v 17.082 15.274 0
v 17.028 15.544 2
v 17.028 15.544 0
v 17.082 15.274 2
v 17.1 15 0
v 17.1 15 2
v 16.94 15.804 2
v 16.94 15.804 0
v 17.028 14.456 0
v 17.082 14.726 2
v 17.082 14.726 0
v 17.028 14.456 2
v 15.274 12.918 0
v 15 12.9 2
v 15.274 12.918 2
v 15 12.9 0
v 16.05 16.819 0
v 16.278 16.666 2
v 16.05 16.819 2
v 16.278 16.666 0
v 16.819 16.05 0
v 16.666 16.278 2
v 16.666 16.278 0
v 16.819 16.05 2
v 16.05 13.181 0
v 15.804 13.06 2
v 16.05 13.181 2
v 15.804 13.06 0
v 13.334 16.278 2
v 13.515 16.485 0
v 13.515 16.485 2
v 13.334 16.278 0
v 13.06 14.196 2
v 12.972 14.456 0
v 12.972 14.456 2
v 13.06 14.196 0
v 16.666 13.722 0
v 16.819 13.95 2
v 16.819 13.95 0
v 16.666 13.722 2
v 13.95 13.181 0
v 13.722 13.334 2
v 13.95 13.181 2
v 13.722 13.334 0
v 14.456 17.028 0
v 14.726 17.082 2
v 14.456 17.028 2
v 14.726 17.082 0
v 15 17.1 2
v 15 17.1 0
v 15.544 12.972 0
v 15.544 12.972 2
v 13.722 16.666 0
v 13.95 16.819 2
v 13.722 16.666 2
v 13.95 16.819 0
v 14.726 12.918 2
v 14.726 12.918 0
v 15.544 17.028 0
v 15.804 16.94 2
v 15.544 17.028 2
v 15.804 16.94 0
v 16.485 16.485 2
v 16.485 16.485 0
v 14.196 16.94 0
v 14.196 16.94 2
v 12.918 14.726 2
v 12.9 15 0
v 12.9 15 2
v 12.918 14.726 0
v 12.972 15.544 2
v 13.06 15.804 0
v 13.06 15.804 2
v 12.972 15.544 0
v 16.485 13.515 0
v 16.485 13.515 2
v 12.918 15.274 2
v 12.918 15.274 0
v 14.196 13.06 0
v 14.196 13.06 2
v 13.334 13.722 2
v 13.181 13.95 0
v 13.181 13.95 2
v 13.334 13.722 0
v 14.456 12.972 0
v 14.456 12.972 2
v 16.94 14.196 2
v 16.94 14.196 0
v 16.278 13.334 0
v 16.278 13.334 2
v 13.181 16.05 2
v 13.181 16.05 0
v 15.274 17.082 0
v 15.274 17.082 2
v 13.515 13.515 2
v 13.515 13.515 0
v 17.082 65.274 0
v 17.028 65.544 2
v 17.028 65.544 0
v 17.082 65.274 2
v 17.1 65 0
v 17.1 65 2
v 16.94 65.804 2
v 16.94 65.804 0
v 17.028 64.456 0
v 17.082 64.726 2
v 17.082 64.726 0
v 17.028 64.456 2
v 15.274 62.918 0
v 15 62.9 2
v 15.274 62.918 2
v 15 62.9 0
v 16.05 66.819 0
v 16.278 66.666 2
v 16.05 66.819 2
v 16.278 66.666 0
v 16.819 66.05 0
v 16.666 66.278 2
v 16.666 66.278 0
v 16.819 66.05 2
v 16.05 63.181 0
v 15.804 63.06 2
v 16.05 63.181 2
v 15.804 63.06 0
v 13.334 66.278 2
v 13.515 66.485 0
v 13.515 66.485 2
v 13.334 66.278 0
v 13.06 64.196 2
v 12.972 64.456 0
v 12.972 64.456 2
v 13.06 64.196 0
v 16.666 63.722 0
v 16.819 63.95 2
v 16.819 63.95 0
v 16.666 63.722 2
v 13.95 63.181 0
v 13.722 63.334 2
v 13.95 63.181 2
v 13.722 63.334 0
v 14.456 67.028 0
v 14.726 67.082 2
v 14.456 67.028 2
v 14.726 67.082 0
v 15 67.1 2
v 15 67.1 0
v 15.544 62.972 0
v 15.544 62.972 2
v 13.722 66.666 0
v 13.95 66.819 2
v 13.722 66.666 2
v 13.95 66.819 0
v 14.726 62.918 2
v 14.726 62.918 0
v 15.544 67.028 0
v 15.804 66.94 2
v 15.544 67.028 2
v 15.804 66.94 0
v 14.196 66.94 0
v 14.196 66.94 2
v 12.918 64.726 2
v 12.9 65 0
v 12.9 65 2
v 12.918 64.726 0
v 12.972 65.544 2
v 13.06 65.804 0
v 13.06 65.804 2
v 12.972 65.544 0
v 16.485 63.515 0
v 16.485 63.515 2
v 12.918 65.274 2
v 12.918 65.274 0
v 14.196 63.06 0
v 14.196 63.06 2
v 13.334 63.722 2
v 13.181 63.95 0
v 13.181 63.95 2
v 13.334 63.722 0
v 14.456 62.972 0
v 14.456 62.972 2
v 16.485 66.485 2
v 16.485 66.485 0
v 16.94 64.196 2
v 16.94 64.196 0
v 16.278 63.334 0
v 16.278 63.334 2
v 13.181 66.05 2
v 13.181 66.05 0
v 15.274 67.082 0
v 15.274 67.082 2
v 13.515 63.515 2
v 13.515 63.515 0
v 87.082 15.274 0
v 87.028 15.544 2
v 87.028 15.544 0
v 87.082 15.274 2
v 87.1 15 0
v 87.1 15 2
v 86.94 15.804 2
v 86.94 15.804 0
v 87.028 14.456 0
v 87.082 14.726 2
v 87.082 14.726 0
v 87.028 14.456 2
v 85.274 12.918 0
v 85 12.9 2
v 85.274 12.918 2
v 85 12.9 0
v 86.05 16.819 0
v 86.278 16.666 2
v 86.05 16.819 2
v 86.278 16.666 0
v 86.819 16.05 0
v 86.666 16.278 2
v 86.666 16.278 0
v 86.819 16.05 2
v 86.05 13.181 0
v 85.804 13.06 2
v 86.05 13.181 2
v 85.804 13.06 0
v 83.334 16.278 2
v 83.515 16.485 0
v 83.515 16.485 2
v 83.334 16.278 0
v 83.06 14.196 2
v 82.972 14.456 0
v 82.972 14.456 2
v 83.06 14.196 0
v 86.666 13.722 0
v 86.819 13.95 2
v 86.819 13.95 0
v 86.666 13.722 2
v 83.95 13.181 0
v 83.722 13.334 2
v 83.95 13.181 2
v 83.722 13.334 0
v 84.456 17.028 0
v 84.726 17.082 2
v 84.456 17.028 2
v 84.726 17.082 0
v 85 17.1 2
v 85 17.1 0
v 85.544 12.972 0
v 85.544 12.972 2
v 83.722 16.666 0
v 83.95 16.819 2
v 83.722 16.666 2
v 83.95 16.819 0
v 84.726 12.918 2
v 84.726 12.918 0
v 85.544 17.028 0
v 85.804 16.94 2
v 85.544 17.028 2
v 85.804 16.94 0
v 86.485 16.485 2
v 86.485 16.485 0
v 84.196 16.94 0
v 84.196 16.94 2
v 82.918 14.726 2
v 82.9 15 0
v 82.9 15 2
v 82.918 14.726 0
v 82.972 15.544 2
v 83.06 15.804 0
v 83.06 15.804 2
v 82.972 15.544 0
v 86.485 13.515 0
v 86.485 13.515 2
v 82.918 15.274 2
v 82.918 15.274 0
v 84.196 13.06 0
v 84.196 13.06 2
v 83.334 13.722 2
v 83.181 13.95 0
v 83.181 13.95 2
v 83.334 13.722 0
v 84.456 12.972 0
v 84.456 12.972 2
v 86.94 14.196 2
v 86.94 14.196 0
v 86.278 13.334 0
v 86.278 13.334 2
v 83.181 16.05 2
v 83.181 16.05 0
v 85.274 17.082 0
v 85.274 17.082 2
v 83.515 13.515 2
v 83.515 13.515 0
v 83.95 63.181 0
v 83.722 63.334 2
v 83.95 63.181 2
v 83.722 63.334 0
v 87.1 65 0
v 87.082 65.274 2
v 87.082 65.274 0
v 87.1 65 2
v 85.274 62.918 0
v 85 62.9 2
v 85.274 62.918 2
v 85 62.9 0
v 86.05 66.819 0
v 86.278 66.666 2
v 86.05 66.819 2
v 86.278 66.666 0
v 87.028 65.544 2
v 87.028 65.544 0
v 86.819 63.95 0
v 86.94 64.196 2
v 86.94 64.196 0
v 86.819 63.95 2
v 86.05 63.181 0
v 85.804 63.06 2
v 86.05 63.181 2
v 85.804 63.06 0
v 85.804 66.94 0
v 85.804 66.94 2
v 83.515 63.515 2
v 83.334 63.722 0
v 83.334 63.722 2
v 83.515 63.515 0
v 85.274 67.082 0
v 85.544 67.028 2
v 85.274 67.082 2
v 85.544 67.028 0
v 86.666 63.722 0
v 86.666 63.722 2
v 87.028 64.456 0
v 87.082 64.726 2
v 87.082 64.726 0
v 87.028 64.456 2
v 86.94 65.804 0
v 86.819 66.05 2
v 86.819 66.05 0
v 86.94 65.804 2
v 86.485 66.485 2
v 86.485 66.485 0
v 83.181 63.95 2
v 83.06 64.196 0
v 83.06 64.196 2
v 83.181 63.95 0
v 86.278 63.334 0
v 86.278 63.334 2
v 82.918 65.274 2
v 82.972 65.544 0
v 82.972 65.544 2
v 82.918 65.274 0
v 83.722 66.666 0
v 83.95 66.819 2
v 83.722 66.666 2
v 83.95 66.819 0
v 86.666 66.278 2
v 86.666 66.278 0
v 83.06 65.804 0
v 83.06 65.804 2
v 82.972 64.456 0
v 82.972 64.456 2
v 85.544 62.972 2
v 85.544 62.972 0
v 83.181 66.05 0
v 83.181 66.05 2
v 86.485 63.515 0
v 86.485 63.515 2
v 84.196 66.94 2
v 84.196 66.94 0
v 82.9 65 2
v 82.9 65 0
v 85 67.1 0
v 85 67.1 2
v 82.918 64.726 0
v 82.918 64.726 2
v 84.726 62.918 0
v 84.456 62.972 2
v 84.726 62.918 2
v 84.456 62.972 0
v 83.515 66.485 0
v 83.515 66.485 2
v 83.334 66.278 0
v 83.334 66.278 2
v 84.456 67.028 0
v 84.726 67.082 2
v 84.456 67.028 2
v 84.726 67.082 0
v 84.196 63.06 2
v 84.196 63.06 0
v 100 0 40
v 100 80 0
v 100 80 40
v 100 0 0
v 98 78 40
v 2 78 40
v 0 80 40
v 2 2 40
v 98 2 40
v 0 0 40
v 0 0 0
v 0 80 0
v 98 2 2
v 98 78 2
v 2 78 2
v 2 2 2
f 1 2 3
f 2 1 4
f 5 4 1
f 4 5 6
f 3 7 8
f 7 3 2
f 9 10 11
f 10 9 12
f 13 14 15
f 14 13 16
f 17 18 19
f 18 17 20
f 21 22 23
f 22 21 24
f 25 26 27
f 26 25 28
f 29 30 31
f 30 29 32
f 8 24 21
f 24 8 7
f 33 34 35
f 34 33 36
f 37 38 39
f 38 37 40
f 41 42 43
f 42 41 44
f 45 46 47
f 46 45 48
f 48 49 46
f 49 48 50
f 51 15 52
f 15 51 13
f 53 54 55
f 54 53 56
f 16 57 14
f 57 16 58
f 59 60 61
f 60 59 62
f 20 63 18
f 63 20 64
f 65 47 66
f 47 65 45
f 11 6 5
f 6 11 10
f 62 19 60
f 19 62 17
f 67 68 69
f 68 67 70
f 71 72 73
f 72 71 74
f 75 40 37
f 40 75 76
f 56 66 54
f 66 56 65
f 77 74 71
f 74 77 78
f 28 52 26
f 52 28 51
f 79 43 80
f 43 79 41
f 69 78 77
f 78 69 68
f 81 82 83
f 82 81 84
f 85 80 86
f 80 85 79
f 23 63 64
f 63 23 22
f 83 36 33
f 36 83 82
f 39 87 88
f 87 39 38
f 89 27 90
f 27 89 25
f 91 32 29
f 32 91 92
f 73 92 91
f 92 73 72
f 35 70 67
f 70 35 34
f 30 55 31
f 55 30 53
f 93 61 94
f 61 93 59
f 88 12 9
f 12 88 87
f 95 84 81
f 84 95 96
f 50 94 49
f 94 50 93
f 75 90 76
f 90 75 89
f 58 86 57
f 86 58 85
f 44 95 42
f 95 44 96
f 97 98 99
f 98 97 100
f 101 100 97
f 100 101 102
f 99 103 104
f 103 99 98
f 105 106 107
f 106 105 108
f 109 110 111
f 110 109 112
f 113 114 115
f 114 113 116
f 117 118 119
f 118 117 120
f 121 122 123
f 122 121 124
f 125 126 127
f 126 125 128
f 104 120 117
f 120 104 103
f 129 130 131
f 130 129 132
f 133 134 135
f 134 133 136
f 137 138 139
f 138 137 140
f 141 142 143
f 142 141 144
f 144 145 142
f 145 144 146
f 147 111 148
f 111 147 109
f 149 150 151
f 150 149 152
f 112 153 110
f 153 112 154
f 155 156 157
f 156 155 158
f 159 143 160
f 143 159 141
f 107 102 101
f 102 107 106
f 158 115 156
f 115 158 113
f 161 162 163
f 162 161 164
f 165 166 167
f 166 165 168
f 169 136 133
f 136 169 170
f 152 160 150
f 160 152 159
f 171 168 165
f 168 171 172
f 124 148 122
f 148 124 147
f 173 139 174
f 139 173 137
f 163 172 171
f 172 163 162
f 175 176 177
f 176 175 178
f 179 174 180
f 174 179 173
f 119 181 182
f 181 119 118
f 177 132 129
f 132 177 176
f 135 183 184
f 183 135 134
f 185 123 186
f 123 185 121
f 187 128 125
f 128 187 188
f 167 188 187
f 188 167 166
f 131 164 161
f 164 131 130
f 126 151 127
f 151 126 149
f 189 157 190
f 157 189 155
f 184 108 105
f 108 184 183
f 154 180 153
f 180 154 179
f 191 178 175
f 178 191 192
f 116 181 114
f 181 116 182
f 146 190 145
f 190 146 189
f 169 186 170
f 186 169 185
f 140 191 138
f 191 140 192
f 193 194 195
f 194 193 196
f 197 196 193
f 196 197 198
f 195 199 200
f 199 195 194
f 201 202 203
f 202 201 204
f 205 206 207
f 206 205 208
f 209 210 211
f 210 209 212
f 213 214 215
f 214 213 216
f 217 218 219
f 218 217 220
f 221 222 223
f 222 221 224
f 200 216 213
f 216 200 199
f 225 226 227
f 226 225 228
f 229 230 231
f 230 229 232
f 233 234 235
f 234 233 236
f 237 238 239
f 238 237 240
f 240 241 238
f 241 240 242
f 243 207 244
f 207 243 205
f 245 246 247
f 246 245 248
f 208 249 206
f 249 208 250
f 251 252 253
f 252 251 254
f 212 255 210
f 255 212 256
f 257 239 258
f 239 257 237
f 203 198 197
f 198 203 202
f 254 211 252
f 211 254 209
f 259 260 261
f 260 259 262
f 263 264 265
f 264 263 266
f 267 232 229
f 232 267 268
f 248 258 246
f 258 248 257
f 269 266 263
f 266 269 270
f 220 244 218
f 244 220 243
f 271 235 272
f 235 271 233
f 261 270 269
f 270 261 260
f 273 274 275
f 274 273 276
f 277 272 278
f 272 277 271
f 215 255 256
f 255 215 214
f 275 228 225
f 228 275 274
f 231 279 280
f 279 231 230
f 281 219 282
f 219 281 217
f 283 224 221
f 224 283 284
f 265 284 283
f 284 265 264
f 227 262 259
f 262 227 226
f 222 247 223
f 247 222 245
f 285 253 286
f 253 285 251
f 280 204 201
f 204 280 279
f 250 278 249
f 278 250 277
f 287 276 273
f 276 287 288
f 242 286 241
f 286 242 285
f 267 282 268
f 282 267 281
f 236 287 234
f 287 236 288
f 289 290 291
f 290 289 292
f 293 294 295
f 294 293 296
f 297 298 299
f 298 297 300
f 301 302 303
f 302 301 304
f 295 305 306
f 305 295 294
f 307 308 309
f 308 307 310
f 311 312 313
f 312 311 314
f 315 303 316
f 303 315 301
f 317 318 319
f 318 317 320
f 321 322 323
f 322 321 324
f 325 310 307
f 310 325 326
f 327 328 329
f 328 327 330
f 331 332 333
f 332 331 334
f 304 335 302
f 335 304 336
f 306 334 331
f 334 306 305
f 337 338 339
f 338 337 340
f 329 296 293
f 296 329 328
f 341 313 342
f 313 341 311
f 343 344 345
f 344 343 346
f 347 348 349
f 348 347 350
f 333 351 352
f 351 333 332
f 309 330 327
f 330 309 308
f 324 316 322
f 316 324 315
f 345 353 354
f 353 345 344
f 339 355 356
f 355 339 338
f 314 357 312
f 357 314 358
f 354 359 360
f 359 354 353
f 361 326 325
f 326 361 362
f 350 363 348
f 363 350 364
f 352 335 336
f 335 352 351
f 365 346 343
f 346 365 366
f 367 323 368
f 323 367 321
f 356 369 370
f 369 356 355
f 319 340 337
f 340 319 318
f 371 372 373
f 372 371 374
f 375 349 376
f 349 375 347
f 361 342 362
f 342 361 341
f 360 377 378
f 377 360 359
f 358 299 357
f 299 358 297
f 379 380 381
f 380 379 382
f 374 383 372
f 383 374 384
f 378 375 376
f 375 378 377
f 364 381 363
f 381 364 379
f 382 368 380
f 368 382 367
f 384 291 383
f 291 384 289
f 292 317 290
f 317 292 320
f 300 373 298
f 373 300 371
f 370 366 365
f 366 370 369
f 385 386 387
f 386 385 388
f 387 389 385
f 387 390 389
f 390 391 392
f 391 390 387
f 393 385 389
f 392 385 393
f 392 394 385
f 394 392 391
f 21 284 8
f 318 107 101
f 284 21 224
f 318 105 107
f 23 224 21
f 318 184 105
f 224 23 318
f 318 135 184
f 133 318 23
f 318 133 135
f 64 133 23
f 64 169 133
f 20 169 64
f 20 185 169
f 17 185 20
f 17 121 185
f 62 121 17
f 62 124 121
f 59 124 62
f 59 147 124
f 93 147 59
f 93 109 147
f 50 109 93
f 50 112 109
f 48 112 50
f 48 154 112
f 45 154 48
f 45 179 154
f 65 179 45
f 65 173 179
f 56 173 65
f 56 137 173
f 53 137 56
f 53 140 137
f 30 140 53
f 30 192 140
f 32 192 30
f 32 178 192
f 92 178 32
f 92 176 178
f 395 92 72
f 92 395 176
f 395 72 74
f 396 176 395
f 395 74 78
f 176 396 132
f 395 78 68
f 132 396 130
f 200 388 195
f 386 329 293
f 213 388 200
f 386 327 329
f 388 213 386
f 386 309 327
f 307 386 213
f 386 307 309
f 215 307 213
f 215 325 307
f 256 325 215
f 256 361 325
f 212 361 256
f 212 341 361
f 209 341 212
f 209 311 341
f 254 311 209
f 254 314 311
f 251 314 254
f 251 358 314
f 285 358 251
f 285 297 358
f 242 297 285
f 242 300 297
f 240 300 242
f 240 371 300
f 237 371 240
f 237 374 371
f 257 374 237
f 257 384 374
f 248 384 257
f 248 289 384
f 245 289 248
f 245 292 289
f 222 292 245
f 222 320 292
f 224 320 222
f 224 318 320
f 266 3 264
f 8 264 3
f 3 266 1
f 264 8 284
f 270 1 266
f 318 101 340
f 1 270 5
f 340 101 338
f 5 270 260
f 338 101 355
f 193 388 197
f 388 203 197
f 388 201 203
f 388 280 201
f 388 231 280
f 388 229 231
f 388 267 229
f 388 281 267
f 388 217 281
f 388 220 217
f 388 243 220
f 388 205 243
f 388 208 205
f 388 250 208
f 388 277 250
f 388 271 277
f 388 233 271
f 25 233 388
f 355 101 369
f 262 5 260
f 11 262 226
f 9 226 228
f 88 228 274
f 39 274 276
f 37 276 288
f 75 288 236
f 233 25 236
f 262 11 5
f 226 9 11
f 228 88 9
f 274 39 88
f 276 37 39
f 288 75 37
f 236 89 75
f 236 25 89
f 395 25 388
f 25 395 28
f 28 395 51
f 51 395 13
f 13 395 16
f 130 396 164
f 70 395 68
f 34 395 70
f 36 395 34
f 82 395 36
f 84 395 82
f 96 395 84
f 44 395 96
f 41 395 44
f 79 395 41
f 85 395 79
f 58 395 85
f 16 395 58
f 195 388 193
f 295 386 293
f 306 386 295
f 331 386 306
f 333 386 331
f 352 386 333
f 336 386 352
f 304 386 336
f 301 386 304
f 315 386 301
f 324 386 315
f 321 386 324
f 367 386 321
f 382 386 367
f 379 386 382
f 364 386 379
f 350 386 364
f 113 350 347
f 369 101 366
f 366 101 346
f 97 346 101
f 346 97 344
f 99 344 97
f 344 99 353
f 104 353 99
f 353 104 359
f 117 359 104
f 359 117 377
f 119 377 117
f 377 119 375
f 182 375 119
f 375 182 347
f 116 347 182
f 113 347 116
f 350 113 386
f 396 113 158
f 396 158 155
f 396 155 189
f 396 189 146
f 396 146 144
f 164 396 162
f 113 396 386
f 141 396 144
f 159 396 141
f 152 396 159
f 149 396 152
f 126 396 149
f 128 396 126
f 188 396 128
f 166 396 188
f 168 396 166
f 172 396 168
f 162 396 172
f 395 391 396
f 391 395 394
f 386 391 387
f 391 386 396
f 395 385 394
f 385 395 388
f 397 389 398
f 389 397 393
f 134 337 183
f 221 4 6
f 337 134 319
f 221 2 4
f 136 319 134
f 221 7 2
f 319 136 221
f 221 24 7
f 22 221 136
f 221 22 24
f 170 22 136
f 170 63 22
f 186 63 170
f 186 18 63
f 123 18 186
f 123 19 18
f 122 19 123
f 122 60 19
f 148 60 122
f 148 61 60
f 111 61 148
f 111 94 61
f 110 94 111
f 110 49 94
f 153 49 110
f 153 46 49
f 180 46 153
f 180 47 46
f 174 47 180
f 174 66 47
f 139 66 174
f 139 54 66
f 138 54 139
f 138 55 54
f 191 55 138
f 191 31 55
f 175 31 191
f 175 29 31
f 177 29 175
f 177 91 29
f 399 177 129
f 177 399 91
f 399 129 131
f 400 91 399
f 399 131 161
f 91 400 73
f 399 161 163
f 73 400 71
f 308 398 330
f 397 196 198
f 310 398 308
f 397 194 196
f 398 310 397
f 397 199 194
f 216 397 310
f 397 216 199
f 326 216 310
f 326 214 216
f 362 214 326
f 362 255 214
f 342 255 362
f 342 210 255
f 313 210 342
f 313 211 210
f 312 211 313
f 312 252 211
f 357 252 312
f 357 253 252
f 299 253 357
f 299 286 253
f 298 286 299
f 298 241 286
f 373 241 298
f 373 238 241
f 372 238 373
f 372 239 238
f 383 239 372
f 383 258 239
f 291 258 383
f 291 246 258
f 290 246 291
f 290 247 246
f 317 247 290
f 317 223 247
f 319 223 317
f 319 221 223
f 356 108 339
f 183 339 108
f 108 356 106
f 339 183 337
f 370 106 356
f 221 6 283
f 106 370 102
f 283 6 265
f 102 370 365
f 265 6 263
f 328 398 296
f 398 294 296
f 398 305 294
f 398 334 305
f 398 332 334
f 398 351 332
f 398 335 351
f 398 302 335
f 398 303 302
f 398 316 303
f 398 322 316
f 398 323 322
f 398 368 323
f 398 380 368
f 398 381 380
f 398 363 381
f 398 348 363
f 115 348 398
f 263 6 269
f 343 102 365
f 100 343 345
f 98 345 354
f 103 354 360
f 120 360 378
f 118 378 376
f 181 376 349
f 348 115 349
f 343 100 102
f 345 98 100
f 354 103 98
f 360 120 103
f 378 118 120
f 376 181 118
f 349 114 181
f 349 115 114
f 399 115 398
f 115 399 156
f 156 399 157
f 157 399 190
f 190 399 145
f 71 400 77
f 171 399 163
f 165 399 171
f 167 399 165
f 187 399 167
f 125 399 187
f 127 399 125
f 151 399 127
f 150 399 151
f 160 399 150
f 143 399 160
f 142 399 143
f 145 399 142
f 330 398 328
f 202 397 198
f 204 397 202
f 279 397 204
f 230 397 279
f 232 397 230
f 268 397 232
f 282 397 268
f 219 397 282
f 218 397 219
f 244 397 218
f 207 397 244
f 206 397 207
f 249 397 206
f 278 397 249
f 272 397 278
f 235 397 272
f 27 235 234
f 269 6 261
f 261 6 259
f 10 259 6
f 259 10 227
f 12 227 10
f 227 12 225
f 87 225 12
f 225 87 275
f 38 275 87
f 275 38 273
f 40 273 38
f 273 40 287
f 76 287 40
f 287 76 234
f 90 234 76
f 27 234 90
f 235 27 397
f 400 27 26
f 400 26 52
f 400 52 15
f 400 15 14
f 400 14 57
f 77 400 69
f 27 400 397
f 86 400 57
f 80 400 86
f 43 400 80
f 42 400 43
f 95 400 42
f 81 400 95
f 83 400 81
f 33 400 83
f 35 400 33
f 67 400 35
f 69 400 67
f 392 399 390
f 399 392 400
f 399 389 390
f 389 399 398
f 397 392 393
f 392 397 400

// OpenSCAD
$fn = 48;
wall = 2.0;

difference() {
    cube([100, 80, 40]);
    translate([wall, wall, wall])
        cube([100 - 2 * wall, 80 - 2 * wall, 40 - wall]);
    for (x = [15, 85], y = [15, 65])
        translate([x, y, -1])
            cylinder(h = 42, r = 2.1);
}
